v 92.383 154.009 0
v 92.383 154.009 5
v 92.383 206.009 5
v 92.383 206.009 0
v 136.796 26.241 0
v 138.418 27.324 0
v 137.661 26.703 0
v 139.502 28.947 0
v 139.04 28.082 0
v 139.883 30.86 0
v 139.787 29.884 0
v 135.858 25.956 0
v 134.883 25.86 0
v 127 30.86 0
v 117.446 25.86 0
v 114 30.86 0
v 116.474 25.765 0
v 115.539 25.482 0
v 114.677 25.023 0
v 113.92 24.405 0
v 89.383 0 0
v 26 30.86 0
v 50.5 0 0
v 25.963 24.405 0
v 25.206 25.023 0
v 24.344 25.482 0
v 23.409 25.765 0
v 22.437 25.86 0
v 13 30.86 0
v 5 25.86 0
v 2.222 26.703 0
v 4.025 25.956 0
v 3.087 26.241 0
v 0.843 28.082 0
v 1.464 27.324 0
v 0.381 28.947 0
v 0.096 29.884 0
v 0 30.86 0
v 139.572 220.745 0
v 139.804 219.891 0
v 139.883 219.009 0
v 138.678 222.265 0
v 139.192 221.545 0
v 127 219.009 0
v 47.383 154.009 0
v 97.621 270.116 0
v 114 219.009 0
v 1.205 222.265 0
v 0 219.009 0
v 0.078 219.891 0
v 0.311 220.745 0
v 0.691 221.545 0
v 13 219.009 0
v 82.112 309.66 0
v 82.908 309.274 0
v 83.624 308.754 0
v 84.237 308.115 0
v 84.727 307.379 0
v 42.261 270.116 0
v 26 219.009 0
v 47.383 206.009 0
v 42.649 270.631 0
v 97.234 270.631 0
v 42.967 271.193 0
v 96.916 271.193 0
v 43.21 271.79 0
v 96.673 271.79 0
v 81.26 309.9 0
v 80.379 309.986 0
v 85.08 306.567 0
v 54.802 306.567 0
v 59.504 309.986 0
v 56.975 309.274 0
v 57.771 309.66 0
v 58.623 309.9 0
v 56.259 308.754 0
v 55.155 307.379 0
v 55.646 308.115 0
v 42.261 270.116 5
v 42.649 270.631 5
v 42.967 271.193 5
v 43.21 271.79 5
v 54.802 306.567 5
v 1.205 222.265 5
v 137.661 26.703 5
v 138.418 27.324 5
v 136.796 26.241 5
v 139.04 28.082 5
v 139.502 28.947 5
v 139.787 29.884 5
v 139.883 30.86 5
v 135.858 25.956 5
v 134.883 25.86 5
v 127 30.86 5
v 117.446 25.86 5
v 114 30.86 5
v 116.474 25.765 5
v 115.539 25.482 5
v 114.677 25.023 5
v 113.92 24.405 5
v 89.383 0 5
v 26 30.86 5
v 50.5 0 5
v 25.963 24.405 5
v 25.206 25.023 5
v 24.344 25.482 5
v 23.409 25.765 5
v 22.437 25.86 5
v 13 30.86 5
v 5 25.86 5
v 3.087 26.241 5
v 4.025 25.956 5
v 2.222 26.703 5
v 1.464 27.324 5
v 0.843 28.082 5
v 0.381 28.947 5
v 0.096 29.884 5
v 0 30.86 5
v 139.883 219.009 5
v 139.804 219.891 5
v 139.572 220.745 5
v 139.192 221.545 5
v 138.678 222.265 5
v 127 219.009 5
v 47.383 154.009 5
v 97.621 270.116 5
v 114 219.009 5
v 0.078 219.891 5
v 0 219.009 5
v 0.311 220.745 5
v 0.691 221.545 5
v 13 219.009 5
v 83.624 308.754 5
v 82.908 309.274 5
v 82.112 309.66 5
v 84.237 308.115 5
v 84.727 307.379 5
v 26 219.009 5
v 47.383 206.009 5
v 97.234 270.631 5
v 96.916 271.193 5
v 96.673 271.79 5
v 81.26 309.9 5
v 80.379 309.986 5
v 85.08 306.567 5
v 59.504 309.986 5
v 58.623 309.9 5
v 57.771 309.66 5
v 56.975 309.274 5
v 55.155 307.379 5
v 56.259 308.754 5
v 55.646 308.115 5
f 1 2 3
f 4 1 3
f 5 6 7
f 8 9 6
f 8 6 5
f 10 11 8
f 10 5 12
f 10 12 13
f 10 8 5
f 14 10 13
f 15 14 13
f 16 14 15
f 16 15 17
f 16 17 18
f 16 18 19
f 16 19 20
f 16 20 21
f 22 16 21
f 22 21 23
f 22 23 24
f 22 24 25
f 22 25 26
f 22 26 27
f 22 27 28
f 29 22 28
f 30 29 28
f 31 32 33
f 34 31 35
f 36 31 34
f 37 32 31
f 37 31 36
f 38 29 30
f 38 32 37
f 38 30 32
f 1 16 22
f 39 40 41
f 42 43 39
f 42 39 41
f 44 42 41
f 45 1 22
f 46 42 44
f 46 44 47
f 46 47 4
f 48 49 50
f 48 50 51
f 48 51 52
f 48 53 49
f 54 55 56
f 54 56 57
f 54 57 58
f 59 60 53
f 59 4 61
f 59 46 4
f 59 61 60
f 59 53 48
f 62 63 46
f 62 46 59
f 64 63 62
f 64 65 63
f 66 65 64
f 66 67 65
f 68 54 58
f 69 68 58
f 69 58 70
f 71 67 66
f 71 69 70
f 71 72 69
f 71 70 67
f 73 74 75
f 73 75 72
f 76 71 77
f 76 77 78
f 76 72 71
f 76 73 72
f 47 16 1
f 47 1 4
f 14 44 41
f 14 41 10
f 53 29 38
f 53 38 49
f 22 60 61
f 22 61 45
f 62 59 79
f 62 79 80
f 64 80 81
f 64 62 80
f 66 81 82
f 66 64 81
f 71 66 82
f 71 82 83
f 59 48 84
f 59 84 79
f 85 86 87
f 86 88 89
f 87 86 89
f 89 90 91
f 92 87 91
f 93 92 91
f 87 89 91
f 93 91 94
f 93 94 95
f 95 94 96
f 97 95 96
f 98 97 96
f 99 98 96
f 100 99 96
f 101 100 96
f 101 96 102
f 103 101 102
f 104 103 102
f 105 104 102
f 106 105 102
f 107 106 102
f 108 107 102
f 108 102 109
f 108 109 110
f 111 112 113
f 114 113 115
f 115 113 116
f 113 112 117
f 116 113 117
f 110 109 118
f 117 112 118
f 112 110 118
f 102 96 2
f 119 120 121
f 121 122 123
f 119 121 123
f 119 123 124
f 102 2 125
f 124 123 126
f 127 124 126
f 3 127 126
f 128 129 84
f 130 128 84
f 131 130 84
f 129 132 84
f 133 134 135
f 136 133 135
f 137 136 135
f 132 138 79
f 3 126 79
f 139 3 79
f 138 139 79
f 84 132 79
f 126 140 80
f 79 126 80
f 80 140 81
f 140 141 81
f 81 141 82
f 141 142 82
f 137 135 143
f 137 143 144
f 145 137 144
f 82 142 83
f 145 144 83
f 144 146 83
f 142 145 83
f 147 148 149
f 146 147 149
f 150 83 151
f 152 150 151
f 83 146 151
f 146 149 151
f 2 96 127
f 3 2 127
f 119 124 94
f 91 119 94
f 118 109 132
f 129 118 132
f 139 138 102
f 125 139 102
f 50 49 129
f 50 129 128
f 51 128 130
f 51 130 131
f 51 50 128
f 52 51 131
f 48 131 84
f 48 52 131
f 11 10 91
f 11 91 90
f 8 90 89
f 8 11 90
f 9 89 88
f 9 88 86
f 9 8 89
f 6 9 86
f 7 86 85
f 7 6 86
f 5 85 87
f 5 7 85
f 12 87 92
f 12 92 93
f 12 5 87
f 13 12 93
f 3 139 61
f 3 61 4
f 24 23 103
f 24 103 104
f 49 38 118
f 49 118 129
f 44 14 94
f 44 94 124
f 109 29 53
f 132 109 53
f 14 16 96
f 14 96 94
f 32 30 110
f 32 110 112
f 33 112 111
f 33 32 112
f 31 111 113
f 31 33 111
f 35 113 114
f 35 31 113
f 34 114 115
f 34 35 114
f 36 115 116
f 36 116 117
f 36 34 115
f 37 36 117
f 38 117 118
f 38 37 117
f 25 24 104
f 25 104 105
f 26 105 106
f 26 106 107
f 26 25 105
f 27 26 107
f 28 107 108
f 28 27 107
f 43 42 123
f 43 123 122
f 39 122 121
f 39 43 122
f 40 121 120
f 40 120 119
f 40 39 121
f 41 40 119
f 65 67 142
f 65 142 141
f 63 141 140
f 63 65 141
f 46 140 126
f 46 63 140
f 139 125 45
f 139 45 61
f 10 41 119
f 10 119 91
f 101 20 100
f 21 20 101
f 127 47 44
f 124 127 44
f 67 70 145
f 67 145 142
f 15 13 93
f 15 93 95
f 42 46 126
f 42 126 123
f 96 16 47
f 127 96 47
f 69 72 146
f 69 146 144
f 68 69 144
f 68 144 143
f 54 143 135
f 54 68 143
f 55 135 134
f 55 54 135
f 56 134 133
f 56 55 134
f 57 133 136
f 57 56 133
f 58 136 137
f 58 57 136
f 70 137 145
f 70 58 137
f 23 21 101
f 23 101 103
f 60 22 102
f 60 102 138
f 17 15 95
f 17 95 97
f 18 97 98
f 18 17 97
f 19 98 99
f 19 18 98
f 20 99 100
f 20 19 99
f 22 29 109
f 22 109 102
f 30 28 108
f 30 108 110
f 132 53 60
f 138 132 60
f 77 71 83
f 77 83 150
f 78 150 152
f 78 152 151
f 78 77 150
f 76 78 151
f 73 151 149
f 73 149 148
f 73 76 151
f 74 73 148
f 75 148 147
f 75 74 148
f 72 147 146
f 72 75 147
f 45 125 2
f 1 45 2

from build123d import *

# Parameters (mm, degrees)
SKETCH1_W           = 13
SKETCH1_H           = 188.148975749
BOSS_EXTRUDE1_DEPTH = 5
SKETCH2_W           = 45
SKETCH2_H           = 52
CUT_EXTRUDE1_DEPTH  = 341.122657523


with BuildPart() as part:
    # Sketch1 → Boss-Extrude1 (new body)
    with BuildSketch(Plane.XY):
        with BuildLine():
            Line((0, 30.859943174), (0, 219.008918923))
            ThreePointArc((0, 219.008918923), (0.311003468, 220.744808182), (1.205324608, 222.264750409))
            Line((1.205324608, 222.264750409), (42.261389271, 270.115641625))
            ThreePointArc((42.261389271, 270.115641625), (42.81710491, 270.906904614), (43.210130369, 271.790334282))
            Line((43.210130369, 271.790334282), (54.802396658, 306.567133147))
            ThreePointArc((54.802396658, 306.567133147), (56.605292439, 309.029920375), (59.503914938, 309.985818768))
            Line((59.503914938, 309.985818768), (80.378944352, 309.985818768))
            ThreePointArc((80.378944352, 309.985818768), (83.277566851, 309.029920375), (85.080462632, 306.567133147))
            Line((85.080462632, 306.567133147), (96.672728921, 271.790334282))
            ThreePointArc((96.672728921, 271.790334282), (97.06575438, 270.906904614), (97.621470019, 270.115641625))
            Line((97.621470019, 270.115641625), (138.677534682, 222.264750409))
            ThreePointArc((138.677534682, 222.264750409), (139.571855822, 220.744808182), (139.88285929, 219.008918923))
            Line((139.88285929, 219.008918923), (139.88285929, 30.859943174))
            ThreePointArc((139.88285929, 30.859943174), (138.418393196, 27.324409268), (134.88285929, 25.859943174))
            Line((134.88285929, 25.859943174), (117.446021446, 25.859943174))
            ThreePointArc((117.446021446, 25.859943174), (115.538843756, 25.481920377), (113.920048724, 24.405012478))
            Line((113.920048724, 24.405012478), (89.38285929, 0))
            Line((89.38285929, 0), (50.5, 0))
            Line((50.5, 0), (25.962810565, 24.405012478))
            ThreePointArc((25.962810565, 24.405012478), (24.344015534, 25.481920377), (22.436837844, 25.859943174))
            Line((22.436837844, 25.859943174), (5, 25.859943174))
            ThreePointArc((5, 25.859943174), (1.464466094, 27.324409268), (0, 30.859943174))
        make_face()
        with Locations((19.5, 124.934431049)):
            Rectangle(SKETCH1_W, SKETCH1_H, mode=Mode.SUBTRACT)
        with Locations((120.5, 124.934431049)):
            Rectangle(SKETCH1_W, SKETCH1_H, mode=Mode.SUBTRACT)
    extrude(amount=BOSS_EXTRUDE1_DEPTH)

    # Sketch2 → Cut-Extrude1 (cut, through all)
    with BuildSketch(Plane.XY.offset(5)):
        with Locations((69.88285929, 180.008918923)):
            Rectangle(SKETCH2_W, SKETCH2_H)
    extrude(amount=-CUT_EXTRUDE1_DEPTH, mode=Mode.SUBTRACT)


solid = part.part
